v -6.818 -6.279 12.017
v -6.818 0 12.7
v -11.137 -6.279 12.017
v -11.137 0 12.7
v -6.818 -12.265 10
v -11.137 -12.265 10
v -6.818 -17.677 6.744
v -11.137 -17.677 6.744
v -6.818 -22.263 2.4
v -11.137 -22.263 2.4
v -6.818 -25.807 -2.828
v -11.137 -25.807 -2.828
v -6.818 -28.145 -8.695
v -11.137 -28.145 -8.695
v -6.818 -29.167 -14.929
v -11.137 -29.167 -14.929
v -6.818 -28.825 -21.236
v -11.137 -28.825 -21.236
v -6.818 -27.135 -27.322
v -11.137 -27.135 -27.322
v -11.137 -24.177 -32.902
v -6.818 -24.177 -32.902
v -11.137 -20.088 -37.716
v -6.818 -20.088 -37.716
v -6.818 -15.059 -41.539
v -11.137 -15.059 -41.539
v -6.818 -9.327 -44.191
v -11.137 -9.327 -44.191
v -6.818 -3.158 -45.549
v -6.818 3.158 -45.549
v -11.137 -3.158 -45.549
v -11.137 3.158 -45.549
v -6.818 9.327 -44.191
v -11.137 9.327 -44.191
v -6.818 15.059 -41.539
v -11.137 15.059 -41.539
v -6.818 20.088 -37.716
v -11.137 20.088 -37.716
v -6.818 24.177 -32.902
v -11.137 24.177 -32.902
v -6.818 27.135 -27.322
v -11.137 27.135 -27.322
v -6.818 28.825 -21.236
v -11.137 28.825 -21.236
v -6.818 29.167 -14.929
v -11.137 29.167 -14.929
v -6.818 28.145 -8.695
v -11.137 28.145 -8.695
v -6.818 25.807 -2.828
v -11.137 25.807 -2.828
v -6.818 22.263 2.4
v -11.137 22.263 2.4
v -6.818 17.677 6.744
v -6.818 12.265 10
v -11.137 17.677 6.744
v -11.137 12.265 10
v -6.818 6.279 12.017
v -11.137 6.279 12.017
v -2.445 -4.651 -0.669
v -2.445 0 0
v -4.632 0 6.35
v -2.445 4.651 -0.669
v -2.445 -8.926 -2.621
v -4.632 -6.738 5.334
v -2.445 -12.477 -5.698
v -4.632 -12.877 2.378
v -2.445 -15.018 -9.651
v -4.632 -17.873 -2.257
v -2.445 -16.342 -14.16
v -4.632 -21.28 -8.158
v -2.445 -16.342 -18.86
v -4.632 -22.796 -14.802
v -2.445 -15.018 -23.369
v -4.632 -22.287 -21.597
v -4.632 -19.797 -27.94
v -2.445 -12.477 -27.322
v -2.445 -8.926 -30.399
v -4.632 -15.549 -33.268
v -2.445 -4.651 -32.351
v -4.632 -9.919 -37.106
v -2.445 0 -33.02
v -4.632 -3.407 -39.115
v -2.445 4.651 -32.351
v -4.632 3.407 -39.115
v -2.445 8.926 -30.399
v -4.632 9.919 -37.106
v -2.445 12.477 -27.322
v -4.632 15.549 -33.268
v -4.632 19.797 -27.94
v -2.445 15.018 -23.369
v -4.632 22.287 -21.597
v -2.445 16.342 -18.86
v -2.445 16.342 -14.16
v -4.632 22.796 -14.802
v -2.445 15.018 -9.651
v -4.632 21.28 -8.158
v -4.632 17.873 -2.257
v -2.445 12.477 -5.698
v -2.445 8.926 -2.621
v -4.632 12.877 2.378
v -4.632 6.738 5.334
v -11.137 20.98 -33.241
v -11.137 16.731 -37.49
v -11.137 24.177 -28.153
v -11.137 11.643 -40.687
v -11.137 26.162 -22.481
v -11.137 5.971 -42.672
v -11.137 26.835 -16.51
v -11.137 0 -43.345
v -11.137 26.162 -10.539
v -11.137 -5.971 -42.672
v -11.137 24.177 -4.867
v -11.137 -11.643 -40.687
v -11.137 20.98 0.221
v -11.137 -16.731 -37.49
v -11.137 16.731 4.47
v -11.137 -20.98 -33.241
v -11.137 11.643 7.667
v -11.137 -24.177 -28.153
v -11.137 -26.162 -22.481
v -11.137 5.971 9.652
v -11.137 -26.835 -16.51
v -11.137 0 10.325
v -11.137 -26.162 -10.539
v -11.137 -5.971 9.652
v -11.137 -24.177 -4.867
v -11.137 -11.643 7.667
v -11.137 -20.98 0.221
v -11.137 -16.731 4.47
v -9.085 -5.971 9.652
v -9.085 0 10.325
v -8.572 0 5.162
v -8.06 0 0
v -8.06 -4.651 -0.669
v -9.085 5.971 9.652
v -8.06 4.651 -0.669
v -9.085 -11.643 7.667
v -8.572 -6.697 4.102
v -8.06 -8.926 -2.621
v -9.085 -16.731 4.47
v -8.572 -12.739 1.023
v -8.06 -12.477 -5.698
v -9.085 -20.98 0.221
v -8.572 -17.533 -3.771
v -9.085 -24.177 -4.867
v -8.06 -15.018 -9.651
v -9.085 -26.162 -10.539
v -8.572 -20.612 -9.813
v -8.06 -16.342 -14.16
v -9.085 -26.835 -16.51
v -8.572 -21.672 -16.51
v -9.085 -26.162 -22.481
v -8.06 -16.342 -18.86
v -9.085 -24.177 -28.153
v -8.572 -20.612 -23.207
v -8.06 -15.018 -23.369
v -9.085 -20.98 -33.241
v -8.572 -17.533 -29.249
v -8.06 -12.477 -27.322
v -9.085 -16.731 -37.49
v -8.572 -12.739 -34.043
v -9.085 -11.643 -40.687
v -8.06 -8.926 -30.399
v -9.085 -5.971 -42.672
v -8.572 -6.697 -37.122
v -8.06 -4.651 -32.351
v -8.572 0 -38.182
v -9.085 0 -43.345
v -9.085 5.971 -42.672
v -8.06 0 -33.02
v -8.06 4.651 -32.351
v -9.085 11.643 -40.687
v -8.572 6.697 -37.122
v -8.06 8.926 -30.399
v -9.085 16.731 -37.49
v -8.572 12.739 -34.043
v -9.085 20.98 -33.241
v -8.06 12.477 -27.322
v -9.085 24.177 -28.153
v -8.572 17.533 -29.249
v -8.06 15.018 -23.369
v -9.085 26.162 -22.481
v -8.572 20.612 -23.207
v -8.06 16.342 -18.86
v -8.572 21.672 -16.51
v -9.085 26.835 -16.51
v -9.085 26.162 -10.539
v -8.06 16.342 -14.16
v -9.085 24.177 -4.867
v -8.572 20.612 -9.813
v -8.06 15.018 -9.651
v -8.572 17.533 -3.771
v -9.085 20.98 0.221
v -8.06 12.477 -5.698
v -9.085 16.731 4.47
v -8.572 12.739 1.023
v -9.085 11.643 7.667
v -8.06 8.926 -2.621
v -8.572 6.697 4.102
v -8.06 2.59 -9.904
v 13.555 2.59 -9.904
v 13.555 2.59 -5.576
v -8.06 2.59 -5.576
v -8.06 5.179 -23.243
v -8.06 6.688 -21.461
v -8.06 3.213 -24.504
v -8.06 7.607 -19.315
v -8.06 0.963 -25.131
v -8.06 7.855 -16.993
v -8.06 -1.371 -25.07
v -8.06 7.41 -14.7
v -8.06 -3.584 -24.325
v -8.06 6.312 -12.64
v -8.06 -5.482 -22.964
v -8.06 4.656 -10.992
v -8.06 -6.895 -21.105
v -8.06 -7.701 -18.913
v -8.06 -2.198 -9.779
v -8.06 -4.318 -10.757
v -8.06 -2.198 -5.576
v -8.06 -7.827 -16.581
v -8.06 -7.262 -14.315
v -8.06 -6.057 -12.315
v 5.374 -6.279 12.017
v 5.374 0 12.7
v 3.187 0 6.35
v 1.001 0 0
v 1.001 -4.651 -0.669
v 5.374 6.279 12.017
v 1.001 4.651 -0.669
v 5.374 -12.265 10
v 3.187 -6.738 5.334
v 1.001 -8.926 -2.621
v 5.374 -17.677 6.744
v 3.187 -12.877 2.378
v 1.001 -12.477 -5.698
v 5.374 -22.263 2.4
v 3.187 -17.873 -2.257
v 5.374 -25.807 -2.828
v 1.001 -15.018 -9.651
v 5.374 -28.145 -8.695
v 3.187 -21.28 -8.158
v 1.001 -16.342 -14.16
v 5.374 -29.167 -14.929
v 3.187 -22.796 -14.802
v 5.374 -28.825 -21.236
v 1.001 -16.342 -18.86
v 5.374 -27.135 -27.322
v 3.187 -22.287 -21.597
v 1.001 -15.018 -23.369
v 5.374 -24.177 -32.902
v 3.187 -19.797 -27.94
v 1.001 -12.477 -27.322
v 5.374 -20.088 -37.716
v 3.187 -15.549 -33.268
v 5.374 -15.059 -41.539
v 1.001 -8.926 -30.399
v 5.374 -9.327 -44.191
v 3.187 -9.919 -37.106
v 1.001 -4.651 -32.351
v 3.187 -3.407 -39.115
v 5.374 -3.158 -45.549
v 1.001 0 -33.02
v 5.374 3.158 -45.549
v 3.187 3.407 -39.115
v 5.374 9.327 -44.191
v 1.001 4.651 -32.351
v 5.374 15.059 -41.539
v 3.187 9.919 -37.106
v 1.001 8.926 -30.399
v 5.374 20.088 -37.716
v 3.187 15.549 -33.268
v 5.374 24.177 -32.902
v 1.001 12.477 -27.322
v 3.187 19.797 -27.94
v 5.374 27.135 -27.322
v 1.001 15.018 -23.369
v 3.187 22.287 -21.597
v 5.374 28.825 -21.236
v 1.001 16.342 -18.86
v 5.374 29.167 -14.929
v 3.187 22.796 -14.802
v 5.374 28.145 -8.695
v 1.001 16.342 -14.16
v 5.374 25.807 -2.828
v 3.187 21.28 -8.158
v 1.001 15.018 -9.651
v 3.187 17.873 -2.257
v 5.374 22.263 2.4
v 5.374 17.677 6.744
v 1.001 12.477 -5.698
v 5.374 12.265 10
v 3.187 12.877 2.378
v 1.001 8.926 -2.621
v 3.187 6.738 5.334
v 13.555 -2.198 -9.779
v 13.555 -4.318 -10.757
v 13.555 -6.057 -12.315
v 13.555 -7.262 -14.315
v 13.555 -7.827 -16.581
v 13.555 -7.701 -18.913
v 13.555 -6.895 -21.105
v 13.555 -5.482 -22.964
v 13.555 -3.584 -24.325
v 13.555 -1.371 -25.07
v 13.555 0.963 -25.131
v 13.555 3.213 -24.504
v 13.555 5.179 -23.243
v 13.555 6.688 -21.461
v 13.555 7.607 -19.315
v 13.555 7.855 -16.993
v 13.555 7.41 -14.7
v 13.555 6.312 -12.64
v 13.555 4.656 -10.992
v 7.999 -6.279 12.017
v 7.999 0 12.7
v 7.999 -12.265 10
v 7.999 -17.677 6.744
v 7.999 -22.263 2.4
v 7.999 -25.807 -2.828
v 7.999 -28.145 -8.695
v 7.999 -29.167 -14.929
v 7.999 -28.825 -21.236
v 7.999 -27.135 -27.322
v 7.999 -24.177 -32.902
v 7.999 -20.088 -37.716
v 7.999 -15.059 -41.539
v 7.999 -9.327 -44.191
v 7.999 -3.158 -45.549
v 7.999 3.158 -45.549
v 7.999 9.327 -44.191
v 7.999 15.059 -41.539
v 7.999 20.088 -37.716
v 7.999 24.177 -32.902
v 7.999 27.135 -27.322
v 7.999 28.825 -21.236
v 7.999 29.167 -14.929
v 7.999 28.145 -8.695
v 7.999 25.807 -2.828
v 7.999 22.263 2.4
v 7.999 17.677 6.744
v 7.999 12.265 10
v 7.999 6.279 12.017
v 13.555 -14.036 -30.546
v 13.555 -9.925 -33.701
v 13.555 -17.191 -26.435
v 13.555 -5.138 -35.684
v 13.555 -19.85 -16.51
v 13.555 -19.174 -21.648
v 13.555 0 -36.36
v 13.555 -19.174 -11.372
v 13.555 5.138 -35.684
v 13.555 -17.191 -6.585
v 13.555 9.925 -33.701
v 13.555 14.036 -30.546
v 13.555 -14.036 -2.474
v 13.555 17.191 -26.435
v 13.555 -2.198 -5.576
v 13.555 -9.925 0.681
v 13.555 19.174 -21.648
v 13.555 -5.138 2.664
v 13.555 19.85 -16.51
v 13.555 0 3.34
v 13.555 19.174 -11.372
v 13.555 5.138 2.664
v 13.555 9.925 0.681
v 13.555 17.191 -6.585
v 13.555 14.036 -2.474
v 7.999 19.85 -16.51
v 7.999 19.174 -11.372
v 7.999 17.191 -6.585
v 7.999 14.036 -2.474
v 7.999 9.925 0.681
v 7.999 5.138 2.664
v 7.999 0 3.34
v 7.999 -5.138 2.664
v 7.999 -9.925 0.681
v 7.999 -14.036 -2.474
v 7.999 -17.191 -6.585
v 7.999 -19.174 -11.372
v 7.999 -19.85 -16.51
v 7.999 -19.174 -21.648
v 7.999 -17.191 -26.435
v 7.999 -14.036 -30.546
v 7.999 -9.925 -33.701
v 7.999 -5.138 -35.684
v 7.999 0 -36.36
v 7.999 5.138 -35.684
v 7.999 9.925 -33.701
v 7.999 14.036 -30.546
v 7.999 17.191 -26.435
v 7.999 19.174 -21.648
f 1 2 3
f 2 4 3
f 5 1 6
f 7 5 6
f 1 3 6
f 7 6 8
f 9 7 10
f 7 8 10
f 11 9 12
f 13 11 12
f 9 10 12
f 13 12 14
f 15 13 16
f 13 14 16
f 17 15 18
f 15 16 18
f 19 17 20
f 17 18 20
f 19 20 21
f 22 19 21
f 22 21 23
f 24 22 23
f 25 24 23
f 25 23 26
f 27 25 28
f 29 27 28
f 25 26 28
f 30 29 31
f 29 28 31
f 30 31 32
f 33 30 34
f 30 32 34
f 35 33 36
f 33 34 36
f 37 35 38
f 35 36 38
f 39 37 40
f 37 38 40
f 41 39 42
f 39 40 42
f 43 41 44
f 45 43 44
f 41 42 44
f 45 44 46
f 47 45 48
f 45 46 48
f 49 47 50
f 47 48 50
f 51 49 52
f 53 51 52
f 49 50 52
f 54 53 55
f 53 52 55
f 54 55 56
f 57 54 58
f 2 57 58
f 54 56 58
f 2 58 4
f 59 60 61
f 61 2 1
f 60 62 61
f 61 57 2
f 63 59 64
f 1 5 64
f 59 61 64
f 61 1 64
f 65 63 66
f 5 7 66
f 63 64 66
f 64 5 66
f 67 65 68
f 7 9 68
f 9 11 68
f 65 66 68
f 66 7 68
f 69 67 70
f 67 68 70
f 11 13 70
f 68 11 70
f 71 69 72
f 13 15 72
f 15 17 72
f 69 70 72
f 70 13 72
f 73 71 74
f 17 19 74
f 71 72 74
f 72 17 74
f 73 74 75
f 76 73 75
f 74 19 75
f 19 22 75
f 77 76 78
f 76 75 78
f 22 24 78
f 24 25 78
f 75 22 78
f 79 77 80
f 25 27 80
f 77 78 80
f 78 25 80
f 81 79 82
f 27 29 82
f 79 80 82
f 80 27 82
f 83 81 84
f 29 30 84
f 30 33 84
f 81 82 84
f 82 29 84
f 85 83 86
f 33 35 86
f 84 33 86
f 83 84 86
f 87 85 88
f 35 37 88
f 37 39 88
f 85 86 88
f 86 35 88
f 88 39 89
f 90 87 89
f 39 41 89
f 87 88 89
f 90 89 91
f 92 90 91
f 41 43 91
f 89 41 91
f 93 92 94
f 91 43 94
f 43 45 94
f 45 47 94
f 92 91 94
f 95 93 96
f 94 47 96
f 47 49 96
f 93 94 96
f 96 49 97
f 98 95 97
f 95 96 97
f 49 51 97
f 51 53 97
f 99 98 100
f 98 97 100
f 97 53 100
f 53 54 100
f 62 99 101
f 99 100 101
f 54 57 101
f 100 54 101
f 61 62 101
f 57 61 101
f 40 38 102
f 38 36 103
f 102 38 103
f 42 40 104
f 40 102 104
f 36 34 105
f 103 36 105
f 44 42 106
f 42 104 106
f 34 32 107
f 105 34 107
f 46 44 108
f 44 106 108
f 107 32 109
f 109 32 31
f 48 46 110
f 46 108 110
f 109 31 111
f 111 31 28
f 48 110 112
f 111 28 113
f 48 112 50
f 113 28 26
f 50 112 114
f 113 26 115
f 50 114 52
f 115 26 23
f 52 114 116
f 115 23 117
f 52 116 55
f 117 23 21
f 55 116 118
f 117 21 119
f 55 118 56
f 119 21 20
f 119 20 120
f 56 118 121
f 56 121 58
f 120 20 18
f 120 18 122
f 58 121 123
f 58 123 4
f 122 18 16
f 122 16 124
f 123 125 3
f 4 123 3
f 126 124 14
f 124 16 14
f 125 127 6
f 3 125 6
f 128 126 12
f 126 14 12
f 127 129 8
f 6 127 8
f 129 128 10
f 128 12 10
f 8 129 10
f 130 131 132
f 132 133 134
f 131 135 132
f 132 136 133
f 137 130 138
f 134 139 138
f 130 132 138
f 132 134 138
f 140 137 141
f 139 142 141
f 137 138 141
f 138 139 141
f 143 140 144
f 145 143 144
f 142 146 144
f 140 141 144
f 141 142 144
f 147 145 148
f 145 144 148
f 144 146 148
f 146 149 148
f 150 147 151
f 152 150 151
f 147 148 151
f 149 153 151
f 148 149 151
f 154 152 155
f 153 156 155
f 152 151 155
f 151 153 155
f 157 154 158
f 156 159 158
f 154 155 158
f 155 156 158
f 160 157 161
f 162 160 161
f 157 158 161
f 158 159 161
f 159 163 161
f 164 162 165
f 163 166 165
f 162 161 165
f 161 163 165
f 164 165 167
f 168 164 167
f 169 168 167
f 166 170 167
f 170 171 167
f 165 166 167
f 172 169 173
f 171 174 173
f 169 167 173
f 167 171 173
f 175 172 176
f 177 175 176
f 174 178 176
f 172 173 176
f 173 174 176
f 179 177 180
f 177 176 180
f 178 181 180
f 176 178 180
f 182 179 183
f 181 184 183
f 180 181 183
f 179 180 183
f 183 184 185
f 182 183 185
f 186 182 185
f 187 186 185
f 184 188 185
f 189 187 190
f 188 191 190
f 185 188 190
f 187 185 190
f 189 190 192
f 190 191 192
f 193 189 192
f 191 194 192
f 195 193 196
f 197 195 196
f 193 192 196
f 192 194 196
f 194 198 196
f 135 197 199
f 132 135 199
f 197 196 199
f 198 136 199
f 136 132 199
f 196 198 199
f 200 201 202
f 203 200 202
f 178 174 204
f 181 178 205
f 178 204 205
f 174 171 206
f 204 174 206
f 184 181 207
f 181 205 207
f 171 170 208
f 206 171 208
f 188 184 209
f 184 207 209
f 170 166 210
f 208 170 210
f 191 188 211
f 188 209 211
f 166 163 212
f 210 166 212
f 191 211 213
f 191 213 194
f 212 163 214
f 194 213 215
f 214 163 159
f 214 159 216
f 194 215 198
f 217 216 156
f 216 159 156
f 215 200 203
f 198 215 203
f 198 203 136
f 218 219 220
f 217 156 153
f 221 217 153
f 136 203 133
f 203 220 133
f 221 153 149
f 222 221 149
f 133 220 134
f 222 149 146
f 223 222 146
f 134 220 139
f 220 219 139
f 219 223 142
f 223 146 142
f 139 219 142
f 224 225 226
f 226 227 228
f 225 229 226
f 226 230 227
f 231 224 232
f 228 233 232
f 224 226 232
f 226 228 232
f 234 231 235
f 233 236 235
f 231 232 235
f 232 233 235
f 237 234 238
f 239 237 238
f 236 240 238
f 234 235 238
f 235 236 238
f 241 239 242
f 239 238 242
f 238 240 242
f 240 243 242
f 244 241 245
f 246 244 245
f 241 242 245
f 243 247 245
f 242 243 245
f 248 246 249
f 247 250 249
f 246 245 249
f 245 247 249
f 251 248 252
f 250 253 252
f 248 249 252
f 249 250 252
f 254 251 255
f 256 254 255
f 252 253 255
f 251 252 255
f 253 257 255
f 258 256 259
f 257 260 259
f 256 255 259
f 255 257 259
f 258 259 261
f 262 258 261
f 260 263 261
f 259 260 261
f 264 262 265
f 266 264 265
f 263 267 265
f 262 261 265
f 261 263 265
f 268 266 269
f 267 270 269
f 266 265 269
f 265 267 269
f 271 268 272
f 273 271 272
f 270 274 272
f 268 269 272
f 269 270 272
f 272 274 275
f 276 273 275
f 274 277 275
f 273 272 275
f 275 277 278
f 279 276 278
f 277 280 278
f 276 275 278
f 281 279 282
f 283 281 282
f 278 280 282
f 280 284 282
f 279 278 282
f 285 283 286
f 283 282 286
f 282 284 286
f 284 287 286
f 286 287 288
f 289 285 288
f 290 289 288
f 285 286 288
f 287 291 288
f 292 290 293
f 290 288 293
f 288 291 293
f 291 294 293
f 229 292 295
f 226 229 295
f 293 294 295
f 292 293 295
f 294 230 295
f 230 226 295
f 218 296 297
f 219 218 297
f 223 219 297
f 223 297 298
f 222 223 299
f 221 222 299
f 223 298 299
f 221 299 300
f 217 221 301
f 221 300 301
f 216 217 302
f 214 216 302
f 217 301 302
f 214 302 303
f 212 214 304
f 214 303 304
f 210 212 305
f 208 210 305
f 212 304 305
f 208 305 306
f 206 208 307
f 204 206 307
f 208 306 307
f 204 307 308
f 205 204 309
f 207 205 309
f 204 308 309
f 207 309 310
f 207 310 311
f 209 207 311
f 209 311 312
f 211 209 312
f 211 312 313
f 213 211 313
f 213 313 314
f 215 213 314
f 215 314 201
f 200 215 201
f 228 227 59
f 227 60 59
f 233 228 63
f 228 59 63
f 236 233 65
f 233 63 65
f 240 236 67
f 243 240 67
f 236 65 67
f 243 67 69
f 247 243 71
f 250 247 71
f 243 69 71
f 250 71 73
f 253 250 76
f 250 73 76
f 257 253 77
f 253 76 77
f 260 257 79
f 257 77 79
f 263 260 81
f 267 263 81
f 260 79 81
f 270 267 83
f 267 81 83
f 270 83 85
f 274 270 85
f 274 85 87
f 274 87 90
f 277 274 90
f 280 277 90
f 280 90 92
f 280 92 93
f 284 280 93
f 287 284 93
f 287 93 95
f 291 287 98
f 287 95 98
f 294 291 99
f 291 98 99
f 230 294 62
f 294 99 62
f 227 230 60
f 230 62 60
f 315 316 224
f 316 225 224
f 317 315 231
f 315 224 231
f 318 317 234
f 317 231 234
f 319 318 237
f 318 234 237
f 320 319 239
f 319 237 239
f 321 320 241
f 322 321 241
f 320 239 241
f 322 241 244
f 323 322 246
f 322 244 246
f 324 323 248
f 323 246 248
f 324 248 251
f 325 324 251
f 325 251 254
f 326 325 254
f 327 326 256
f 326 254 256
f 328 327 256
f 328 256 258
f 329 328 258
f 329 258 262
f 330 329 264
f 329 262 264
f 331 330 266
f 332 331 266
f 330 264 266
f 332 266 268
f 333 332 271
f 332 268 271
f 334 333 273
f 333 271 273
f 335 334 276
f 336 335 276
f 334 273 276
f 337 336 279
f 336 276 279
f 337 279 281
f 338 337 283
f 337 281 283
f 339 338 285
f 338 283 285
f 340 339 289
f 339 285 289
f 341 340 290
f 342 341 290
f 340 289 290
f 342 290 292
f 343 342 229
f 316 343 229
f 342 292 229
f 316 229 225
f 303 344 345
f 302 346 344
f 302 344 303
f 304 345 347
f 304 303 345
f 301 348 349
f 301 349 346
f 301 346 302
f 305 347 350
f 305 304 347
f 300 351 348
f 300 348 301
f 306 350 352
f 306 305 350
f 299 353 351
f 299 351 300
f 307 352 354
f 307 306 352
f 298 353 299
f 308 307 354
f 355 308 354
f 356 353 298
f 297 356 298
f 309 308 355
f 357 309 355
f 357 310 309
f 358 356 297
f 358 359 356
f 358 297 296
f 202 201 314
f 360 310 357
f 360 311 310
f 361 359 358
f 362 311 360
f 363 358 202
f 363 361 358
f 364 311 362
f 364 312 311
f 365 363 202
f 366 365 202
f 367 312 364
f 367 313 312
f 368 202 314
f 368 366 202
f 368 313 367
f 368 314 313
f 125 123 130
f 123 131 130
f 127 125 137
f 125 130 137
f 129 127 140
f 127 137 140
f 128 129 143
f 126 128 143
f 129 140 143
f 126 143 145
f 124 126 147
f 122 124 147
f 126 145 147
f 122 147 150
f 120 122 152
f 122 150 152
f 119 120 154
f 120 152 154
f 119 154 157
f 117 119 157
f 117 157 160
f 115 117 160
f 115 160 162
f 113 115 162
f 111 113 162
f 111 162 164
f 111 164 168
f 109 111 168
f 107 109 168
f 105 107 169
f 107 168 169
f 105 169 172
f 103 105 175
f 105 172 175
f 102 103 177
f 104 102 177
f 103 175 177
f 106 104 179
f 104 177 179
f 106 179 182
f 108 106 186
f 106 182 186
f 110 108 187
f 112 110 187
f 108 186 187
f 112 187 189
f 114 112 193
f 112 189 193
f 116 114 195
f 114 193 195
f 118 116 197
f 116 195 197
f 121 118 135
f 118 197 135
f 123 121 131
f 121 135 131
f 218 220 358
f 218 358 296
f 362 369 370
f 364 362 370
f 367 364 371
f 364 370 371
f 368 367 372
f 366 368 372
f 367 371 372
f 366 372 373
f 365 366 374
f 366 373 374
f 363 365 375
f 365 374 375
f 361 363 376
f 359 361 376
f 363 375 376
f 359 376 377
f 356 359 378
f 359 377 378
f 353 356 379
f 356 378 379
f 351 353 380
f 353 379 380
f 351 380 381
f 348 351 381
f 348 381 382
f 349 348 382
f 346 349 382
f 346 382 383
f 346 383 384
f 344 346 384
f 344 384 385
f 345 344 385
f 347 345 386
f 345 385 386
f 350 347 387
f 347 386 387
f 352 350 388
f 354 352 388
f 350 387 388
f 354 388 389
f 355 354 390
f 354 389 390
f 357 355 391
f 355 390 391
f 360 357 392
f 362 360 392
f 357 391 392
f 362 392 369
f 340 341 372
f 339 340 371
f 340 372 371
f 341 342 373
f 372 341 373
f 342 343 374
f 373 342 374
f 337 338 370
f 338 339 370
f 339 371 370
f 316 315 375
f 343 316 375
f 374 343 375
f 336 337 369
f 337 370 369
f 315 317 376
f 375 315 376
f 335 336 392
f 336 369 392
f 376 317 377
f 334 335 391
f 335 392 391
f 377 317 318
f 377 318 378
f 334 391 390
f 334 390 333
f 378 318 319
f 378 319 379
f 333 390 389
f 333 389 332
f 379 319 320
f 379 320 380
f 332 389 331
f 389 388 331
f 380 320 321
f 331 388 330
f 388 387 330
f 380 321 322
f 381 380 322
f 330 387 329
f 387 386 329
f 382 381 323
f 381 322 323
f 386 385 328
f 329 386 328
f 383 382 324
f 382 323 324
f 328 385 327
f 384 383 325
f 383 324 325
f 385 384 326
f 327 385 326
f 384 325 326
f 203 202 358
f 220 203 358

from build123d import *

# Parameters (mm, degrees)
F2_R     = 19.8501
F3_DEPTH = 5.55625
F5_DEPTH = 254


with BuildPart() as f1:
    # F0 (on Front) → F1 (revolve)
    with BuildSketch(Plane.XZ):
        Polygon((1.00091, 0), (0, 0), (-2.445169, 0), (-6.818129, 12.7), (-11.137133, 12.7), (-11.137133, 10.324578), (-9.085405, 10.324578), (-8.059541, 0), (-8.059541, -16.51), (7.999178, -16.51), (7.999178, 0), (7.999178, 12.7), (5.373871, 12.7), align=None)
    revolve(axis=Axis((-0.030182, 0, -16.51), (1, 0, 0)))

    # F2 (on face) → F3 (join)
    with BuildSketch(Plane.YZ.offset(7.999178)):
        with Locations((0, -16.51)):
            Circle(F2_R)
    extrude(amount=F3_DEPTH)

    # F4 (on face) → F5 (cut)
    with BuildSketch(Plane.YZ.offset(13.555428)):
        with BuildLine():
            Line((-2.197634, -5.575972), (-2.197634, -9.778679))
            ThreePointArc((-2.197634, -9.778679), (-0.206109, -25.187333), (2.590266, -9.904236))
            Line((2.590266, -9.904236), (2.590266, -5.575972))
            Line((2.590266, -5.575972), (-2.197634, -5.575972))
        make_face()
    extrude(amount=-F5_DEPTH, mode=Mode.SUBTRACT)


solid = f1.part
